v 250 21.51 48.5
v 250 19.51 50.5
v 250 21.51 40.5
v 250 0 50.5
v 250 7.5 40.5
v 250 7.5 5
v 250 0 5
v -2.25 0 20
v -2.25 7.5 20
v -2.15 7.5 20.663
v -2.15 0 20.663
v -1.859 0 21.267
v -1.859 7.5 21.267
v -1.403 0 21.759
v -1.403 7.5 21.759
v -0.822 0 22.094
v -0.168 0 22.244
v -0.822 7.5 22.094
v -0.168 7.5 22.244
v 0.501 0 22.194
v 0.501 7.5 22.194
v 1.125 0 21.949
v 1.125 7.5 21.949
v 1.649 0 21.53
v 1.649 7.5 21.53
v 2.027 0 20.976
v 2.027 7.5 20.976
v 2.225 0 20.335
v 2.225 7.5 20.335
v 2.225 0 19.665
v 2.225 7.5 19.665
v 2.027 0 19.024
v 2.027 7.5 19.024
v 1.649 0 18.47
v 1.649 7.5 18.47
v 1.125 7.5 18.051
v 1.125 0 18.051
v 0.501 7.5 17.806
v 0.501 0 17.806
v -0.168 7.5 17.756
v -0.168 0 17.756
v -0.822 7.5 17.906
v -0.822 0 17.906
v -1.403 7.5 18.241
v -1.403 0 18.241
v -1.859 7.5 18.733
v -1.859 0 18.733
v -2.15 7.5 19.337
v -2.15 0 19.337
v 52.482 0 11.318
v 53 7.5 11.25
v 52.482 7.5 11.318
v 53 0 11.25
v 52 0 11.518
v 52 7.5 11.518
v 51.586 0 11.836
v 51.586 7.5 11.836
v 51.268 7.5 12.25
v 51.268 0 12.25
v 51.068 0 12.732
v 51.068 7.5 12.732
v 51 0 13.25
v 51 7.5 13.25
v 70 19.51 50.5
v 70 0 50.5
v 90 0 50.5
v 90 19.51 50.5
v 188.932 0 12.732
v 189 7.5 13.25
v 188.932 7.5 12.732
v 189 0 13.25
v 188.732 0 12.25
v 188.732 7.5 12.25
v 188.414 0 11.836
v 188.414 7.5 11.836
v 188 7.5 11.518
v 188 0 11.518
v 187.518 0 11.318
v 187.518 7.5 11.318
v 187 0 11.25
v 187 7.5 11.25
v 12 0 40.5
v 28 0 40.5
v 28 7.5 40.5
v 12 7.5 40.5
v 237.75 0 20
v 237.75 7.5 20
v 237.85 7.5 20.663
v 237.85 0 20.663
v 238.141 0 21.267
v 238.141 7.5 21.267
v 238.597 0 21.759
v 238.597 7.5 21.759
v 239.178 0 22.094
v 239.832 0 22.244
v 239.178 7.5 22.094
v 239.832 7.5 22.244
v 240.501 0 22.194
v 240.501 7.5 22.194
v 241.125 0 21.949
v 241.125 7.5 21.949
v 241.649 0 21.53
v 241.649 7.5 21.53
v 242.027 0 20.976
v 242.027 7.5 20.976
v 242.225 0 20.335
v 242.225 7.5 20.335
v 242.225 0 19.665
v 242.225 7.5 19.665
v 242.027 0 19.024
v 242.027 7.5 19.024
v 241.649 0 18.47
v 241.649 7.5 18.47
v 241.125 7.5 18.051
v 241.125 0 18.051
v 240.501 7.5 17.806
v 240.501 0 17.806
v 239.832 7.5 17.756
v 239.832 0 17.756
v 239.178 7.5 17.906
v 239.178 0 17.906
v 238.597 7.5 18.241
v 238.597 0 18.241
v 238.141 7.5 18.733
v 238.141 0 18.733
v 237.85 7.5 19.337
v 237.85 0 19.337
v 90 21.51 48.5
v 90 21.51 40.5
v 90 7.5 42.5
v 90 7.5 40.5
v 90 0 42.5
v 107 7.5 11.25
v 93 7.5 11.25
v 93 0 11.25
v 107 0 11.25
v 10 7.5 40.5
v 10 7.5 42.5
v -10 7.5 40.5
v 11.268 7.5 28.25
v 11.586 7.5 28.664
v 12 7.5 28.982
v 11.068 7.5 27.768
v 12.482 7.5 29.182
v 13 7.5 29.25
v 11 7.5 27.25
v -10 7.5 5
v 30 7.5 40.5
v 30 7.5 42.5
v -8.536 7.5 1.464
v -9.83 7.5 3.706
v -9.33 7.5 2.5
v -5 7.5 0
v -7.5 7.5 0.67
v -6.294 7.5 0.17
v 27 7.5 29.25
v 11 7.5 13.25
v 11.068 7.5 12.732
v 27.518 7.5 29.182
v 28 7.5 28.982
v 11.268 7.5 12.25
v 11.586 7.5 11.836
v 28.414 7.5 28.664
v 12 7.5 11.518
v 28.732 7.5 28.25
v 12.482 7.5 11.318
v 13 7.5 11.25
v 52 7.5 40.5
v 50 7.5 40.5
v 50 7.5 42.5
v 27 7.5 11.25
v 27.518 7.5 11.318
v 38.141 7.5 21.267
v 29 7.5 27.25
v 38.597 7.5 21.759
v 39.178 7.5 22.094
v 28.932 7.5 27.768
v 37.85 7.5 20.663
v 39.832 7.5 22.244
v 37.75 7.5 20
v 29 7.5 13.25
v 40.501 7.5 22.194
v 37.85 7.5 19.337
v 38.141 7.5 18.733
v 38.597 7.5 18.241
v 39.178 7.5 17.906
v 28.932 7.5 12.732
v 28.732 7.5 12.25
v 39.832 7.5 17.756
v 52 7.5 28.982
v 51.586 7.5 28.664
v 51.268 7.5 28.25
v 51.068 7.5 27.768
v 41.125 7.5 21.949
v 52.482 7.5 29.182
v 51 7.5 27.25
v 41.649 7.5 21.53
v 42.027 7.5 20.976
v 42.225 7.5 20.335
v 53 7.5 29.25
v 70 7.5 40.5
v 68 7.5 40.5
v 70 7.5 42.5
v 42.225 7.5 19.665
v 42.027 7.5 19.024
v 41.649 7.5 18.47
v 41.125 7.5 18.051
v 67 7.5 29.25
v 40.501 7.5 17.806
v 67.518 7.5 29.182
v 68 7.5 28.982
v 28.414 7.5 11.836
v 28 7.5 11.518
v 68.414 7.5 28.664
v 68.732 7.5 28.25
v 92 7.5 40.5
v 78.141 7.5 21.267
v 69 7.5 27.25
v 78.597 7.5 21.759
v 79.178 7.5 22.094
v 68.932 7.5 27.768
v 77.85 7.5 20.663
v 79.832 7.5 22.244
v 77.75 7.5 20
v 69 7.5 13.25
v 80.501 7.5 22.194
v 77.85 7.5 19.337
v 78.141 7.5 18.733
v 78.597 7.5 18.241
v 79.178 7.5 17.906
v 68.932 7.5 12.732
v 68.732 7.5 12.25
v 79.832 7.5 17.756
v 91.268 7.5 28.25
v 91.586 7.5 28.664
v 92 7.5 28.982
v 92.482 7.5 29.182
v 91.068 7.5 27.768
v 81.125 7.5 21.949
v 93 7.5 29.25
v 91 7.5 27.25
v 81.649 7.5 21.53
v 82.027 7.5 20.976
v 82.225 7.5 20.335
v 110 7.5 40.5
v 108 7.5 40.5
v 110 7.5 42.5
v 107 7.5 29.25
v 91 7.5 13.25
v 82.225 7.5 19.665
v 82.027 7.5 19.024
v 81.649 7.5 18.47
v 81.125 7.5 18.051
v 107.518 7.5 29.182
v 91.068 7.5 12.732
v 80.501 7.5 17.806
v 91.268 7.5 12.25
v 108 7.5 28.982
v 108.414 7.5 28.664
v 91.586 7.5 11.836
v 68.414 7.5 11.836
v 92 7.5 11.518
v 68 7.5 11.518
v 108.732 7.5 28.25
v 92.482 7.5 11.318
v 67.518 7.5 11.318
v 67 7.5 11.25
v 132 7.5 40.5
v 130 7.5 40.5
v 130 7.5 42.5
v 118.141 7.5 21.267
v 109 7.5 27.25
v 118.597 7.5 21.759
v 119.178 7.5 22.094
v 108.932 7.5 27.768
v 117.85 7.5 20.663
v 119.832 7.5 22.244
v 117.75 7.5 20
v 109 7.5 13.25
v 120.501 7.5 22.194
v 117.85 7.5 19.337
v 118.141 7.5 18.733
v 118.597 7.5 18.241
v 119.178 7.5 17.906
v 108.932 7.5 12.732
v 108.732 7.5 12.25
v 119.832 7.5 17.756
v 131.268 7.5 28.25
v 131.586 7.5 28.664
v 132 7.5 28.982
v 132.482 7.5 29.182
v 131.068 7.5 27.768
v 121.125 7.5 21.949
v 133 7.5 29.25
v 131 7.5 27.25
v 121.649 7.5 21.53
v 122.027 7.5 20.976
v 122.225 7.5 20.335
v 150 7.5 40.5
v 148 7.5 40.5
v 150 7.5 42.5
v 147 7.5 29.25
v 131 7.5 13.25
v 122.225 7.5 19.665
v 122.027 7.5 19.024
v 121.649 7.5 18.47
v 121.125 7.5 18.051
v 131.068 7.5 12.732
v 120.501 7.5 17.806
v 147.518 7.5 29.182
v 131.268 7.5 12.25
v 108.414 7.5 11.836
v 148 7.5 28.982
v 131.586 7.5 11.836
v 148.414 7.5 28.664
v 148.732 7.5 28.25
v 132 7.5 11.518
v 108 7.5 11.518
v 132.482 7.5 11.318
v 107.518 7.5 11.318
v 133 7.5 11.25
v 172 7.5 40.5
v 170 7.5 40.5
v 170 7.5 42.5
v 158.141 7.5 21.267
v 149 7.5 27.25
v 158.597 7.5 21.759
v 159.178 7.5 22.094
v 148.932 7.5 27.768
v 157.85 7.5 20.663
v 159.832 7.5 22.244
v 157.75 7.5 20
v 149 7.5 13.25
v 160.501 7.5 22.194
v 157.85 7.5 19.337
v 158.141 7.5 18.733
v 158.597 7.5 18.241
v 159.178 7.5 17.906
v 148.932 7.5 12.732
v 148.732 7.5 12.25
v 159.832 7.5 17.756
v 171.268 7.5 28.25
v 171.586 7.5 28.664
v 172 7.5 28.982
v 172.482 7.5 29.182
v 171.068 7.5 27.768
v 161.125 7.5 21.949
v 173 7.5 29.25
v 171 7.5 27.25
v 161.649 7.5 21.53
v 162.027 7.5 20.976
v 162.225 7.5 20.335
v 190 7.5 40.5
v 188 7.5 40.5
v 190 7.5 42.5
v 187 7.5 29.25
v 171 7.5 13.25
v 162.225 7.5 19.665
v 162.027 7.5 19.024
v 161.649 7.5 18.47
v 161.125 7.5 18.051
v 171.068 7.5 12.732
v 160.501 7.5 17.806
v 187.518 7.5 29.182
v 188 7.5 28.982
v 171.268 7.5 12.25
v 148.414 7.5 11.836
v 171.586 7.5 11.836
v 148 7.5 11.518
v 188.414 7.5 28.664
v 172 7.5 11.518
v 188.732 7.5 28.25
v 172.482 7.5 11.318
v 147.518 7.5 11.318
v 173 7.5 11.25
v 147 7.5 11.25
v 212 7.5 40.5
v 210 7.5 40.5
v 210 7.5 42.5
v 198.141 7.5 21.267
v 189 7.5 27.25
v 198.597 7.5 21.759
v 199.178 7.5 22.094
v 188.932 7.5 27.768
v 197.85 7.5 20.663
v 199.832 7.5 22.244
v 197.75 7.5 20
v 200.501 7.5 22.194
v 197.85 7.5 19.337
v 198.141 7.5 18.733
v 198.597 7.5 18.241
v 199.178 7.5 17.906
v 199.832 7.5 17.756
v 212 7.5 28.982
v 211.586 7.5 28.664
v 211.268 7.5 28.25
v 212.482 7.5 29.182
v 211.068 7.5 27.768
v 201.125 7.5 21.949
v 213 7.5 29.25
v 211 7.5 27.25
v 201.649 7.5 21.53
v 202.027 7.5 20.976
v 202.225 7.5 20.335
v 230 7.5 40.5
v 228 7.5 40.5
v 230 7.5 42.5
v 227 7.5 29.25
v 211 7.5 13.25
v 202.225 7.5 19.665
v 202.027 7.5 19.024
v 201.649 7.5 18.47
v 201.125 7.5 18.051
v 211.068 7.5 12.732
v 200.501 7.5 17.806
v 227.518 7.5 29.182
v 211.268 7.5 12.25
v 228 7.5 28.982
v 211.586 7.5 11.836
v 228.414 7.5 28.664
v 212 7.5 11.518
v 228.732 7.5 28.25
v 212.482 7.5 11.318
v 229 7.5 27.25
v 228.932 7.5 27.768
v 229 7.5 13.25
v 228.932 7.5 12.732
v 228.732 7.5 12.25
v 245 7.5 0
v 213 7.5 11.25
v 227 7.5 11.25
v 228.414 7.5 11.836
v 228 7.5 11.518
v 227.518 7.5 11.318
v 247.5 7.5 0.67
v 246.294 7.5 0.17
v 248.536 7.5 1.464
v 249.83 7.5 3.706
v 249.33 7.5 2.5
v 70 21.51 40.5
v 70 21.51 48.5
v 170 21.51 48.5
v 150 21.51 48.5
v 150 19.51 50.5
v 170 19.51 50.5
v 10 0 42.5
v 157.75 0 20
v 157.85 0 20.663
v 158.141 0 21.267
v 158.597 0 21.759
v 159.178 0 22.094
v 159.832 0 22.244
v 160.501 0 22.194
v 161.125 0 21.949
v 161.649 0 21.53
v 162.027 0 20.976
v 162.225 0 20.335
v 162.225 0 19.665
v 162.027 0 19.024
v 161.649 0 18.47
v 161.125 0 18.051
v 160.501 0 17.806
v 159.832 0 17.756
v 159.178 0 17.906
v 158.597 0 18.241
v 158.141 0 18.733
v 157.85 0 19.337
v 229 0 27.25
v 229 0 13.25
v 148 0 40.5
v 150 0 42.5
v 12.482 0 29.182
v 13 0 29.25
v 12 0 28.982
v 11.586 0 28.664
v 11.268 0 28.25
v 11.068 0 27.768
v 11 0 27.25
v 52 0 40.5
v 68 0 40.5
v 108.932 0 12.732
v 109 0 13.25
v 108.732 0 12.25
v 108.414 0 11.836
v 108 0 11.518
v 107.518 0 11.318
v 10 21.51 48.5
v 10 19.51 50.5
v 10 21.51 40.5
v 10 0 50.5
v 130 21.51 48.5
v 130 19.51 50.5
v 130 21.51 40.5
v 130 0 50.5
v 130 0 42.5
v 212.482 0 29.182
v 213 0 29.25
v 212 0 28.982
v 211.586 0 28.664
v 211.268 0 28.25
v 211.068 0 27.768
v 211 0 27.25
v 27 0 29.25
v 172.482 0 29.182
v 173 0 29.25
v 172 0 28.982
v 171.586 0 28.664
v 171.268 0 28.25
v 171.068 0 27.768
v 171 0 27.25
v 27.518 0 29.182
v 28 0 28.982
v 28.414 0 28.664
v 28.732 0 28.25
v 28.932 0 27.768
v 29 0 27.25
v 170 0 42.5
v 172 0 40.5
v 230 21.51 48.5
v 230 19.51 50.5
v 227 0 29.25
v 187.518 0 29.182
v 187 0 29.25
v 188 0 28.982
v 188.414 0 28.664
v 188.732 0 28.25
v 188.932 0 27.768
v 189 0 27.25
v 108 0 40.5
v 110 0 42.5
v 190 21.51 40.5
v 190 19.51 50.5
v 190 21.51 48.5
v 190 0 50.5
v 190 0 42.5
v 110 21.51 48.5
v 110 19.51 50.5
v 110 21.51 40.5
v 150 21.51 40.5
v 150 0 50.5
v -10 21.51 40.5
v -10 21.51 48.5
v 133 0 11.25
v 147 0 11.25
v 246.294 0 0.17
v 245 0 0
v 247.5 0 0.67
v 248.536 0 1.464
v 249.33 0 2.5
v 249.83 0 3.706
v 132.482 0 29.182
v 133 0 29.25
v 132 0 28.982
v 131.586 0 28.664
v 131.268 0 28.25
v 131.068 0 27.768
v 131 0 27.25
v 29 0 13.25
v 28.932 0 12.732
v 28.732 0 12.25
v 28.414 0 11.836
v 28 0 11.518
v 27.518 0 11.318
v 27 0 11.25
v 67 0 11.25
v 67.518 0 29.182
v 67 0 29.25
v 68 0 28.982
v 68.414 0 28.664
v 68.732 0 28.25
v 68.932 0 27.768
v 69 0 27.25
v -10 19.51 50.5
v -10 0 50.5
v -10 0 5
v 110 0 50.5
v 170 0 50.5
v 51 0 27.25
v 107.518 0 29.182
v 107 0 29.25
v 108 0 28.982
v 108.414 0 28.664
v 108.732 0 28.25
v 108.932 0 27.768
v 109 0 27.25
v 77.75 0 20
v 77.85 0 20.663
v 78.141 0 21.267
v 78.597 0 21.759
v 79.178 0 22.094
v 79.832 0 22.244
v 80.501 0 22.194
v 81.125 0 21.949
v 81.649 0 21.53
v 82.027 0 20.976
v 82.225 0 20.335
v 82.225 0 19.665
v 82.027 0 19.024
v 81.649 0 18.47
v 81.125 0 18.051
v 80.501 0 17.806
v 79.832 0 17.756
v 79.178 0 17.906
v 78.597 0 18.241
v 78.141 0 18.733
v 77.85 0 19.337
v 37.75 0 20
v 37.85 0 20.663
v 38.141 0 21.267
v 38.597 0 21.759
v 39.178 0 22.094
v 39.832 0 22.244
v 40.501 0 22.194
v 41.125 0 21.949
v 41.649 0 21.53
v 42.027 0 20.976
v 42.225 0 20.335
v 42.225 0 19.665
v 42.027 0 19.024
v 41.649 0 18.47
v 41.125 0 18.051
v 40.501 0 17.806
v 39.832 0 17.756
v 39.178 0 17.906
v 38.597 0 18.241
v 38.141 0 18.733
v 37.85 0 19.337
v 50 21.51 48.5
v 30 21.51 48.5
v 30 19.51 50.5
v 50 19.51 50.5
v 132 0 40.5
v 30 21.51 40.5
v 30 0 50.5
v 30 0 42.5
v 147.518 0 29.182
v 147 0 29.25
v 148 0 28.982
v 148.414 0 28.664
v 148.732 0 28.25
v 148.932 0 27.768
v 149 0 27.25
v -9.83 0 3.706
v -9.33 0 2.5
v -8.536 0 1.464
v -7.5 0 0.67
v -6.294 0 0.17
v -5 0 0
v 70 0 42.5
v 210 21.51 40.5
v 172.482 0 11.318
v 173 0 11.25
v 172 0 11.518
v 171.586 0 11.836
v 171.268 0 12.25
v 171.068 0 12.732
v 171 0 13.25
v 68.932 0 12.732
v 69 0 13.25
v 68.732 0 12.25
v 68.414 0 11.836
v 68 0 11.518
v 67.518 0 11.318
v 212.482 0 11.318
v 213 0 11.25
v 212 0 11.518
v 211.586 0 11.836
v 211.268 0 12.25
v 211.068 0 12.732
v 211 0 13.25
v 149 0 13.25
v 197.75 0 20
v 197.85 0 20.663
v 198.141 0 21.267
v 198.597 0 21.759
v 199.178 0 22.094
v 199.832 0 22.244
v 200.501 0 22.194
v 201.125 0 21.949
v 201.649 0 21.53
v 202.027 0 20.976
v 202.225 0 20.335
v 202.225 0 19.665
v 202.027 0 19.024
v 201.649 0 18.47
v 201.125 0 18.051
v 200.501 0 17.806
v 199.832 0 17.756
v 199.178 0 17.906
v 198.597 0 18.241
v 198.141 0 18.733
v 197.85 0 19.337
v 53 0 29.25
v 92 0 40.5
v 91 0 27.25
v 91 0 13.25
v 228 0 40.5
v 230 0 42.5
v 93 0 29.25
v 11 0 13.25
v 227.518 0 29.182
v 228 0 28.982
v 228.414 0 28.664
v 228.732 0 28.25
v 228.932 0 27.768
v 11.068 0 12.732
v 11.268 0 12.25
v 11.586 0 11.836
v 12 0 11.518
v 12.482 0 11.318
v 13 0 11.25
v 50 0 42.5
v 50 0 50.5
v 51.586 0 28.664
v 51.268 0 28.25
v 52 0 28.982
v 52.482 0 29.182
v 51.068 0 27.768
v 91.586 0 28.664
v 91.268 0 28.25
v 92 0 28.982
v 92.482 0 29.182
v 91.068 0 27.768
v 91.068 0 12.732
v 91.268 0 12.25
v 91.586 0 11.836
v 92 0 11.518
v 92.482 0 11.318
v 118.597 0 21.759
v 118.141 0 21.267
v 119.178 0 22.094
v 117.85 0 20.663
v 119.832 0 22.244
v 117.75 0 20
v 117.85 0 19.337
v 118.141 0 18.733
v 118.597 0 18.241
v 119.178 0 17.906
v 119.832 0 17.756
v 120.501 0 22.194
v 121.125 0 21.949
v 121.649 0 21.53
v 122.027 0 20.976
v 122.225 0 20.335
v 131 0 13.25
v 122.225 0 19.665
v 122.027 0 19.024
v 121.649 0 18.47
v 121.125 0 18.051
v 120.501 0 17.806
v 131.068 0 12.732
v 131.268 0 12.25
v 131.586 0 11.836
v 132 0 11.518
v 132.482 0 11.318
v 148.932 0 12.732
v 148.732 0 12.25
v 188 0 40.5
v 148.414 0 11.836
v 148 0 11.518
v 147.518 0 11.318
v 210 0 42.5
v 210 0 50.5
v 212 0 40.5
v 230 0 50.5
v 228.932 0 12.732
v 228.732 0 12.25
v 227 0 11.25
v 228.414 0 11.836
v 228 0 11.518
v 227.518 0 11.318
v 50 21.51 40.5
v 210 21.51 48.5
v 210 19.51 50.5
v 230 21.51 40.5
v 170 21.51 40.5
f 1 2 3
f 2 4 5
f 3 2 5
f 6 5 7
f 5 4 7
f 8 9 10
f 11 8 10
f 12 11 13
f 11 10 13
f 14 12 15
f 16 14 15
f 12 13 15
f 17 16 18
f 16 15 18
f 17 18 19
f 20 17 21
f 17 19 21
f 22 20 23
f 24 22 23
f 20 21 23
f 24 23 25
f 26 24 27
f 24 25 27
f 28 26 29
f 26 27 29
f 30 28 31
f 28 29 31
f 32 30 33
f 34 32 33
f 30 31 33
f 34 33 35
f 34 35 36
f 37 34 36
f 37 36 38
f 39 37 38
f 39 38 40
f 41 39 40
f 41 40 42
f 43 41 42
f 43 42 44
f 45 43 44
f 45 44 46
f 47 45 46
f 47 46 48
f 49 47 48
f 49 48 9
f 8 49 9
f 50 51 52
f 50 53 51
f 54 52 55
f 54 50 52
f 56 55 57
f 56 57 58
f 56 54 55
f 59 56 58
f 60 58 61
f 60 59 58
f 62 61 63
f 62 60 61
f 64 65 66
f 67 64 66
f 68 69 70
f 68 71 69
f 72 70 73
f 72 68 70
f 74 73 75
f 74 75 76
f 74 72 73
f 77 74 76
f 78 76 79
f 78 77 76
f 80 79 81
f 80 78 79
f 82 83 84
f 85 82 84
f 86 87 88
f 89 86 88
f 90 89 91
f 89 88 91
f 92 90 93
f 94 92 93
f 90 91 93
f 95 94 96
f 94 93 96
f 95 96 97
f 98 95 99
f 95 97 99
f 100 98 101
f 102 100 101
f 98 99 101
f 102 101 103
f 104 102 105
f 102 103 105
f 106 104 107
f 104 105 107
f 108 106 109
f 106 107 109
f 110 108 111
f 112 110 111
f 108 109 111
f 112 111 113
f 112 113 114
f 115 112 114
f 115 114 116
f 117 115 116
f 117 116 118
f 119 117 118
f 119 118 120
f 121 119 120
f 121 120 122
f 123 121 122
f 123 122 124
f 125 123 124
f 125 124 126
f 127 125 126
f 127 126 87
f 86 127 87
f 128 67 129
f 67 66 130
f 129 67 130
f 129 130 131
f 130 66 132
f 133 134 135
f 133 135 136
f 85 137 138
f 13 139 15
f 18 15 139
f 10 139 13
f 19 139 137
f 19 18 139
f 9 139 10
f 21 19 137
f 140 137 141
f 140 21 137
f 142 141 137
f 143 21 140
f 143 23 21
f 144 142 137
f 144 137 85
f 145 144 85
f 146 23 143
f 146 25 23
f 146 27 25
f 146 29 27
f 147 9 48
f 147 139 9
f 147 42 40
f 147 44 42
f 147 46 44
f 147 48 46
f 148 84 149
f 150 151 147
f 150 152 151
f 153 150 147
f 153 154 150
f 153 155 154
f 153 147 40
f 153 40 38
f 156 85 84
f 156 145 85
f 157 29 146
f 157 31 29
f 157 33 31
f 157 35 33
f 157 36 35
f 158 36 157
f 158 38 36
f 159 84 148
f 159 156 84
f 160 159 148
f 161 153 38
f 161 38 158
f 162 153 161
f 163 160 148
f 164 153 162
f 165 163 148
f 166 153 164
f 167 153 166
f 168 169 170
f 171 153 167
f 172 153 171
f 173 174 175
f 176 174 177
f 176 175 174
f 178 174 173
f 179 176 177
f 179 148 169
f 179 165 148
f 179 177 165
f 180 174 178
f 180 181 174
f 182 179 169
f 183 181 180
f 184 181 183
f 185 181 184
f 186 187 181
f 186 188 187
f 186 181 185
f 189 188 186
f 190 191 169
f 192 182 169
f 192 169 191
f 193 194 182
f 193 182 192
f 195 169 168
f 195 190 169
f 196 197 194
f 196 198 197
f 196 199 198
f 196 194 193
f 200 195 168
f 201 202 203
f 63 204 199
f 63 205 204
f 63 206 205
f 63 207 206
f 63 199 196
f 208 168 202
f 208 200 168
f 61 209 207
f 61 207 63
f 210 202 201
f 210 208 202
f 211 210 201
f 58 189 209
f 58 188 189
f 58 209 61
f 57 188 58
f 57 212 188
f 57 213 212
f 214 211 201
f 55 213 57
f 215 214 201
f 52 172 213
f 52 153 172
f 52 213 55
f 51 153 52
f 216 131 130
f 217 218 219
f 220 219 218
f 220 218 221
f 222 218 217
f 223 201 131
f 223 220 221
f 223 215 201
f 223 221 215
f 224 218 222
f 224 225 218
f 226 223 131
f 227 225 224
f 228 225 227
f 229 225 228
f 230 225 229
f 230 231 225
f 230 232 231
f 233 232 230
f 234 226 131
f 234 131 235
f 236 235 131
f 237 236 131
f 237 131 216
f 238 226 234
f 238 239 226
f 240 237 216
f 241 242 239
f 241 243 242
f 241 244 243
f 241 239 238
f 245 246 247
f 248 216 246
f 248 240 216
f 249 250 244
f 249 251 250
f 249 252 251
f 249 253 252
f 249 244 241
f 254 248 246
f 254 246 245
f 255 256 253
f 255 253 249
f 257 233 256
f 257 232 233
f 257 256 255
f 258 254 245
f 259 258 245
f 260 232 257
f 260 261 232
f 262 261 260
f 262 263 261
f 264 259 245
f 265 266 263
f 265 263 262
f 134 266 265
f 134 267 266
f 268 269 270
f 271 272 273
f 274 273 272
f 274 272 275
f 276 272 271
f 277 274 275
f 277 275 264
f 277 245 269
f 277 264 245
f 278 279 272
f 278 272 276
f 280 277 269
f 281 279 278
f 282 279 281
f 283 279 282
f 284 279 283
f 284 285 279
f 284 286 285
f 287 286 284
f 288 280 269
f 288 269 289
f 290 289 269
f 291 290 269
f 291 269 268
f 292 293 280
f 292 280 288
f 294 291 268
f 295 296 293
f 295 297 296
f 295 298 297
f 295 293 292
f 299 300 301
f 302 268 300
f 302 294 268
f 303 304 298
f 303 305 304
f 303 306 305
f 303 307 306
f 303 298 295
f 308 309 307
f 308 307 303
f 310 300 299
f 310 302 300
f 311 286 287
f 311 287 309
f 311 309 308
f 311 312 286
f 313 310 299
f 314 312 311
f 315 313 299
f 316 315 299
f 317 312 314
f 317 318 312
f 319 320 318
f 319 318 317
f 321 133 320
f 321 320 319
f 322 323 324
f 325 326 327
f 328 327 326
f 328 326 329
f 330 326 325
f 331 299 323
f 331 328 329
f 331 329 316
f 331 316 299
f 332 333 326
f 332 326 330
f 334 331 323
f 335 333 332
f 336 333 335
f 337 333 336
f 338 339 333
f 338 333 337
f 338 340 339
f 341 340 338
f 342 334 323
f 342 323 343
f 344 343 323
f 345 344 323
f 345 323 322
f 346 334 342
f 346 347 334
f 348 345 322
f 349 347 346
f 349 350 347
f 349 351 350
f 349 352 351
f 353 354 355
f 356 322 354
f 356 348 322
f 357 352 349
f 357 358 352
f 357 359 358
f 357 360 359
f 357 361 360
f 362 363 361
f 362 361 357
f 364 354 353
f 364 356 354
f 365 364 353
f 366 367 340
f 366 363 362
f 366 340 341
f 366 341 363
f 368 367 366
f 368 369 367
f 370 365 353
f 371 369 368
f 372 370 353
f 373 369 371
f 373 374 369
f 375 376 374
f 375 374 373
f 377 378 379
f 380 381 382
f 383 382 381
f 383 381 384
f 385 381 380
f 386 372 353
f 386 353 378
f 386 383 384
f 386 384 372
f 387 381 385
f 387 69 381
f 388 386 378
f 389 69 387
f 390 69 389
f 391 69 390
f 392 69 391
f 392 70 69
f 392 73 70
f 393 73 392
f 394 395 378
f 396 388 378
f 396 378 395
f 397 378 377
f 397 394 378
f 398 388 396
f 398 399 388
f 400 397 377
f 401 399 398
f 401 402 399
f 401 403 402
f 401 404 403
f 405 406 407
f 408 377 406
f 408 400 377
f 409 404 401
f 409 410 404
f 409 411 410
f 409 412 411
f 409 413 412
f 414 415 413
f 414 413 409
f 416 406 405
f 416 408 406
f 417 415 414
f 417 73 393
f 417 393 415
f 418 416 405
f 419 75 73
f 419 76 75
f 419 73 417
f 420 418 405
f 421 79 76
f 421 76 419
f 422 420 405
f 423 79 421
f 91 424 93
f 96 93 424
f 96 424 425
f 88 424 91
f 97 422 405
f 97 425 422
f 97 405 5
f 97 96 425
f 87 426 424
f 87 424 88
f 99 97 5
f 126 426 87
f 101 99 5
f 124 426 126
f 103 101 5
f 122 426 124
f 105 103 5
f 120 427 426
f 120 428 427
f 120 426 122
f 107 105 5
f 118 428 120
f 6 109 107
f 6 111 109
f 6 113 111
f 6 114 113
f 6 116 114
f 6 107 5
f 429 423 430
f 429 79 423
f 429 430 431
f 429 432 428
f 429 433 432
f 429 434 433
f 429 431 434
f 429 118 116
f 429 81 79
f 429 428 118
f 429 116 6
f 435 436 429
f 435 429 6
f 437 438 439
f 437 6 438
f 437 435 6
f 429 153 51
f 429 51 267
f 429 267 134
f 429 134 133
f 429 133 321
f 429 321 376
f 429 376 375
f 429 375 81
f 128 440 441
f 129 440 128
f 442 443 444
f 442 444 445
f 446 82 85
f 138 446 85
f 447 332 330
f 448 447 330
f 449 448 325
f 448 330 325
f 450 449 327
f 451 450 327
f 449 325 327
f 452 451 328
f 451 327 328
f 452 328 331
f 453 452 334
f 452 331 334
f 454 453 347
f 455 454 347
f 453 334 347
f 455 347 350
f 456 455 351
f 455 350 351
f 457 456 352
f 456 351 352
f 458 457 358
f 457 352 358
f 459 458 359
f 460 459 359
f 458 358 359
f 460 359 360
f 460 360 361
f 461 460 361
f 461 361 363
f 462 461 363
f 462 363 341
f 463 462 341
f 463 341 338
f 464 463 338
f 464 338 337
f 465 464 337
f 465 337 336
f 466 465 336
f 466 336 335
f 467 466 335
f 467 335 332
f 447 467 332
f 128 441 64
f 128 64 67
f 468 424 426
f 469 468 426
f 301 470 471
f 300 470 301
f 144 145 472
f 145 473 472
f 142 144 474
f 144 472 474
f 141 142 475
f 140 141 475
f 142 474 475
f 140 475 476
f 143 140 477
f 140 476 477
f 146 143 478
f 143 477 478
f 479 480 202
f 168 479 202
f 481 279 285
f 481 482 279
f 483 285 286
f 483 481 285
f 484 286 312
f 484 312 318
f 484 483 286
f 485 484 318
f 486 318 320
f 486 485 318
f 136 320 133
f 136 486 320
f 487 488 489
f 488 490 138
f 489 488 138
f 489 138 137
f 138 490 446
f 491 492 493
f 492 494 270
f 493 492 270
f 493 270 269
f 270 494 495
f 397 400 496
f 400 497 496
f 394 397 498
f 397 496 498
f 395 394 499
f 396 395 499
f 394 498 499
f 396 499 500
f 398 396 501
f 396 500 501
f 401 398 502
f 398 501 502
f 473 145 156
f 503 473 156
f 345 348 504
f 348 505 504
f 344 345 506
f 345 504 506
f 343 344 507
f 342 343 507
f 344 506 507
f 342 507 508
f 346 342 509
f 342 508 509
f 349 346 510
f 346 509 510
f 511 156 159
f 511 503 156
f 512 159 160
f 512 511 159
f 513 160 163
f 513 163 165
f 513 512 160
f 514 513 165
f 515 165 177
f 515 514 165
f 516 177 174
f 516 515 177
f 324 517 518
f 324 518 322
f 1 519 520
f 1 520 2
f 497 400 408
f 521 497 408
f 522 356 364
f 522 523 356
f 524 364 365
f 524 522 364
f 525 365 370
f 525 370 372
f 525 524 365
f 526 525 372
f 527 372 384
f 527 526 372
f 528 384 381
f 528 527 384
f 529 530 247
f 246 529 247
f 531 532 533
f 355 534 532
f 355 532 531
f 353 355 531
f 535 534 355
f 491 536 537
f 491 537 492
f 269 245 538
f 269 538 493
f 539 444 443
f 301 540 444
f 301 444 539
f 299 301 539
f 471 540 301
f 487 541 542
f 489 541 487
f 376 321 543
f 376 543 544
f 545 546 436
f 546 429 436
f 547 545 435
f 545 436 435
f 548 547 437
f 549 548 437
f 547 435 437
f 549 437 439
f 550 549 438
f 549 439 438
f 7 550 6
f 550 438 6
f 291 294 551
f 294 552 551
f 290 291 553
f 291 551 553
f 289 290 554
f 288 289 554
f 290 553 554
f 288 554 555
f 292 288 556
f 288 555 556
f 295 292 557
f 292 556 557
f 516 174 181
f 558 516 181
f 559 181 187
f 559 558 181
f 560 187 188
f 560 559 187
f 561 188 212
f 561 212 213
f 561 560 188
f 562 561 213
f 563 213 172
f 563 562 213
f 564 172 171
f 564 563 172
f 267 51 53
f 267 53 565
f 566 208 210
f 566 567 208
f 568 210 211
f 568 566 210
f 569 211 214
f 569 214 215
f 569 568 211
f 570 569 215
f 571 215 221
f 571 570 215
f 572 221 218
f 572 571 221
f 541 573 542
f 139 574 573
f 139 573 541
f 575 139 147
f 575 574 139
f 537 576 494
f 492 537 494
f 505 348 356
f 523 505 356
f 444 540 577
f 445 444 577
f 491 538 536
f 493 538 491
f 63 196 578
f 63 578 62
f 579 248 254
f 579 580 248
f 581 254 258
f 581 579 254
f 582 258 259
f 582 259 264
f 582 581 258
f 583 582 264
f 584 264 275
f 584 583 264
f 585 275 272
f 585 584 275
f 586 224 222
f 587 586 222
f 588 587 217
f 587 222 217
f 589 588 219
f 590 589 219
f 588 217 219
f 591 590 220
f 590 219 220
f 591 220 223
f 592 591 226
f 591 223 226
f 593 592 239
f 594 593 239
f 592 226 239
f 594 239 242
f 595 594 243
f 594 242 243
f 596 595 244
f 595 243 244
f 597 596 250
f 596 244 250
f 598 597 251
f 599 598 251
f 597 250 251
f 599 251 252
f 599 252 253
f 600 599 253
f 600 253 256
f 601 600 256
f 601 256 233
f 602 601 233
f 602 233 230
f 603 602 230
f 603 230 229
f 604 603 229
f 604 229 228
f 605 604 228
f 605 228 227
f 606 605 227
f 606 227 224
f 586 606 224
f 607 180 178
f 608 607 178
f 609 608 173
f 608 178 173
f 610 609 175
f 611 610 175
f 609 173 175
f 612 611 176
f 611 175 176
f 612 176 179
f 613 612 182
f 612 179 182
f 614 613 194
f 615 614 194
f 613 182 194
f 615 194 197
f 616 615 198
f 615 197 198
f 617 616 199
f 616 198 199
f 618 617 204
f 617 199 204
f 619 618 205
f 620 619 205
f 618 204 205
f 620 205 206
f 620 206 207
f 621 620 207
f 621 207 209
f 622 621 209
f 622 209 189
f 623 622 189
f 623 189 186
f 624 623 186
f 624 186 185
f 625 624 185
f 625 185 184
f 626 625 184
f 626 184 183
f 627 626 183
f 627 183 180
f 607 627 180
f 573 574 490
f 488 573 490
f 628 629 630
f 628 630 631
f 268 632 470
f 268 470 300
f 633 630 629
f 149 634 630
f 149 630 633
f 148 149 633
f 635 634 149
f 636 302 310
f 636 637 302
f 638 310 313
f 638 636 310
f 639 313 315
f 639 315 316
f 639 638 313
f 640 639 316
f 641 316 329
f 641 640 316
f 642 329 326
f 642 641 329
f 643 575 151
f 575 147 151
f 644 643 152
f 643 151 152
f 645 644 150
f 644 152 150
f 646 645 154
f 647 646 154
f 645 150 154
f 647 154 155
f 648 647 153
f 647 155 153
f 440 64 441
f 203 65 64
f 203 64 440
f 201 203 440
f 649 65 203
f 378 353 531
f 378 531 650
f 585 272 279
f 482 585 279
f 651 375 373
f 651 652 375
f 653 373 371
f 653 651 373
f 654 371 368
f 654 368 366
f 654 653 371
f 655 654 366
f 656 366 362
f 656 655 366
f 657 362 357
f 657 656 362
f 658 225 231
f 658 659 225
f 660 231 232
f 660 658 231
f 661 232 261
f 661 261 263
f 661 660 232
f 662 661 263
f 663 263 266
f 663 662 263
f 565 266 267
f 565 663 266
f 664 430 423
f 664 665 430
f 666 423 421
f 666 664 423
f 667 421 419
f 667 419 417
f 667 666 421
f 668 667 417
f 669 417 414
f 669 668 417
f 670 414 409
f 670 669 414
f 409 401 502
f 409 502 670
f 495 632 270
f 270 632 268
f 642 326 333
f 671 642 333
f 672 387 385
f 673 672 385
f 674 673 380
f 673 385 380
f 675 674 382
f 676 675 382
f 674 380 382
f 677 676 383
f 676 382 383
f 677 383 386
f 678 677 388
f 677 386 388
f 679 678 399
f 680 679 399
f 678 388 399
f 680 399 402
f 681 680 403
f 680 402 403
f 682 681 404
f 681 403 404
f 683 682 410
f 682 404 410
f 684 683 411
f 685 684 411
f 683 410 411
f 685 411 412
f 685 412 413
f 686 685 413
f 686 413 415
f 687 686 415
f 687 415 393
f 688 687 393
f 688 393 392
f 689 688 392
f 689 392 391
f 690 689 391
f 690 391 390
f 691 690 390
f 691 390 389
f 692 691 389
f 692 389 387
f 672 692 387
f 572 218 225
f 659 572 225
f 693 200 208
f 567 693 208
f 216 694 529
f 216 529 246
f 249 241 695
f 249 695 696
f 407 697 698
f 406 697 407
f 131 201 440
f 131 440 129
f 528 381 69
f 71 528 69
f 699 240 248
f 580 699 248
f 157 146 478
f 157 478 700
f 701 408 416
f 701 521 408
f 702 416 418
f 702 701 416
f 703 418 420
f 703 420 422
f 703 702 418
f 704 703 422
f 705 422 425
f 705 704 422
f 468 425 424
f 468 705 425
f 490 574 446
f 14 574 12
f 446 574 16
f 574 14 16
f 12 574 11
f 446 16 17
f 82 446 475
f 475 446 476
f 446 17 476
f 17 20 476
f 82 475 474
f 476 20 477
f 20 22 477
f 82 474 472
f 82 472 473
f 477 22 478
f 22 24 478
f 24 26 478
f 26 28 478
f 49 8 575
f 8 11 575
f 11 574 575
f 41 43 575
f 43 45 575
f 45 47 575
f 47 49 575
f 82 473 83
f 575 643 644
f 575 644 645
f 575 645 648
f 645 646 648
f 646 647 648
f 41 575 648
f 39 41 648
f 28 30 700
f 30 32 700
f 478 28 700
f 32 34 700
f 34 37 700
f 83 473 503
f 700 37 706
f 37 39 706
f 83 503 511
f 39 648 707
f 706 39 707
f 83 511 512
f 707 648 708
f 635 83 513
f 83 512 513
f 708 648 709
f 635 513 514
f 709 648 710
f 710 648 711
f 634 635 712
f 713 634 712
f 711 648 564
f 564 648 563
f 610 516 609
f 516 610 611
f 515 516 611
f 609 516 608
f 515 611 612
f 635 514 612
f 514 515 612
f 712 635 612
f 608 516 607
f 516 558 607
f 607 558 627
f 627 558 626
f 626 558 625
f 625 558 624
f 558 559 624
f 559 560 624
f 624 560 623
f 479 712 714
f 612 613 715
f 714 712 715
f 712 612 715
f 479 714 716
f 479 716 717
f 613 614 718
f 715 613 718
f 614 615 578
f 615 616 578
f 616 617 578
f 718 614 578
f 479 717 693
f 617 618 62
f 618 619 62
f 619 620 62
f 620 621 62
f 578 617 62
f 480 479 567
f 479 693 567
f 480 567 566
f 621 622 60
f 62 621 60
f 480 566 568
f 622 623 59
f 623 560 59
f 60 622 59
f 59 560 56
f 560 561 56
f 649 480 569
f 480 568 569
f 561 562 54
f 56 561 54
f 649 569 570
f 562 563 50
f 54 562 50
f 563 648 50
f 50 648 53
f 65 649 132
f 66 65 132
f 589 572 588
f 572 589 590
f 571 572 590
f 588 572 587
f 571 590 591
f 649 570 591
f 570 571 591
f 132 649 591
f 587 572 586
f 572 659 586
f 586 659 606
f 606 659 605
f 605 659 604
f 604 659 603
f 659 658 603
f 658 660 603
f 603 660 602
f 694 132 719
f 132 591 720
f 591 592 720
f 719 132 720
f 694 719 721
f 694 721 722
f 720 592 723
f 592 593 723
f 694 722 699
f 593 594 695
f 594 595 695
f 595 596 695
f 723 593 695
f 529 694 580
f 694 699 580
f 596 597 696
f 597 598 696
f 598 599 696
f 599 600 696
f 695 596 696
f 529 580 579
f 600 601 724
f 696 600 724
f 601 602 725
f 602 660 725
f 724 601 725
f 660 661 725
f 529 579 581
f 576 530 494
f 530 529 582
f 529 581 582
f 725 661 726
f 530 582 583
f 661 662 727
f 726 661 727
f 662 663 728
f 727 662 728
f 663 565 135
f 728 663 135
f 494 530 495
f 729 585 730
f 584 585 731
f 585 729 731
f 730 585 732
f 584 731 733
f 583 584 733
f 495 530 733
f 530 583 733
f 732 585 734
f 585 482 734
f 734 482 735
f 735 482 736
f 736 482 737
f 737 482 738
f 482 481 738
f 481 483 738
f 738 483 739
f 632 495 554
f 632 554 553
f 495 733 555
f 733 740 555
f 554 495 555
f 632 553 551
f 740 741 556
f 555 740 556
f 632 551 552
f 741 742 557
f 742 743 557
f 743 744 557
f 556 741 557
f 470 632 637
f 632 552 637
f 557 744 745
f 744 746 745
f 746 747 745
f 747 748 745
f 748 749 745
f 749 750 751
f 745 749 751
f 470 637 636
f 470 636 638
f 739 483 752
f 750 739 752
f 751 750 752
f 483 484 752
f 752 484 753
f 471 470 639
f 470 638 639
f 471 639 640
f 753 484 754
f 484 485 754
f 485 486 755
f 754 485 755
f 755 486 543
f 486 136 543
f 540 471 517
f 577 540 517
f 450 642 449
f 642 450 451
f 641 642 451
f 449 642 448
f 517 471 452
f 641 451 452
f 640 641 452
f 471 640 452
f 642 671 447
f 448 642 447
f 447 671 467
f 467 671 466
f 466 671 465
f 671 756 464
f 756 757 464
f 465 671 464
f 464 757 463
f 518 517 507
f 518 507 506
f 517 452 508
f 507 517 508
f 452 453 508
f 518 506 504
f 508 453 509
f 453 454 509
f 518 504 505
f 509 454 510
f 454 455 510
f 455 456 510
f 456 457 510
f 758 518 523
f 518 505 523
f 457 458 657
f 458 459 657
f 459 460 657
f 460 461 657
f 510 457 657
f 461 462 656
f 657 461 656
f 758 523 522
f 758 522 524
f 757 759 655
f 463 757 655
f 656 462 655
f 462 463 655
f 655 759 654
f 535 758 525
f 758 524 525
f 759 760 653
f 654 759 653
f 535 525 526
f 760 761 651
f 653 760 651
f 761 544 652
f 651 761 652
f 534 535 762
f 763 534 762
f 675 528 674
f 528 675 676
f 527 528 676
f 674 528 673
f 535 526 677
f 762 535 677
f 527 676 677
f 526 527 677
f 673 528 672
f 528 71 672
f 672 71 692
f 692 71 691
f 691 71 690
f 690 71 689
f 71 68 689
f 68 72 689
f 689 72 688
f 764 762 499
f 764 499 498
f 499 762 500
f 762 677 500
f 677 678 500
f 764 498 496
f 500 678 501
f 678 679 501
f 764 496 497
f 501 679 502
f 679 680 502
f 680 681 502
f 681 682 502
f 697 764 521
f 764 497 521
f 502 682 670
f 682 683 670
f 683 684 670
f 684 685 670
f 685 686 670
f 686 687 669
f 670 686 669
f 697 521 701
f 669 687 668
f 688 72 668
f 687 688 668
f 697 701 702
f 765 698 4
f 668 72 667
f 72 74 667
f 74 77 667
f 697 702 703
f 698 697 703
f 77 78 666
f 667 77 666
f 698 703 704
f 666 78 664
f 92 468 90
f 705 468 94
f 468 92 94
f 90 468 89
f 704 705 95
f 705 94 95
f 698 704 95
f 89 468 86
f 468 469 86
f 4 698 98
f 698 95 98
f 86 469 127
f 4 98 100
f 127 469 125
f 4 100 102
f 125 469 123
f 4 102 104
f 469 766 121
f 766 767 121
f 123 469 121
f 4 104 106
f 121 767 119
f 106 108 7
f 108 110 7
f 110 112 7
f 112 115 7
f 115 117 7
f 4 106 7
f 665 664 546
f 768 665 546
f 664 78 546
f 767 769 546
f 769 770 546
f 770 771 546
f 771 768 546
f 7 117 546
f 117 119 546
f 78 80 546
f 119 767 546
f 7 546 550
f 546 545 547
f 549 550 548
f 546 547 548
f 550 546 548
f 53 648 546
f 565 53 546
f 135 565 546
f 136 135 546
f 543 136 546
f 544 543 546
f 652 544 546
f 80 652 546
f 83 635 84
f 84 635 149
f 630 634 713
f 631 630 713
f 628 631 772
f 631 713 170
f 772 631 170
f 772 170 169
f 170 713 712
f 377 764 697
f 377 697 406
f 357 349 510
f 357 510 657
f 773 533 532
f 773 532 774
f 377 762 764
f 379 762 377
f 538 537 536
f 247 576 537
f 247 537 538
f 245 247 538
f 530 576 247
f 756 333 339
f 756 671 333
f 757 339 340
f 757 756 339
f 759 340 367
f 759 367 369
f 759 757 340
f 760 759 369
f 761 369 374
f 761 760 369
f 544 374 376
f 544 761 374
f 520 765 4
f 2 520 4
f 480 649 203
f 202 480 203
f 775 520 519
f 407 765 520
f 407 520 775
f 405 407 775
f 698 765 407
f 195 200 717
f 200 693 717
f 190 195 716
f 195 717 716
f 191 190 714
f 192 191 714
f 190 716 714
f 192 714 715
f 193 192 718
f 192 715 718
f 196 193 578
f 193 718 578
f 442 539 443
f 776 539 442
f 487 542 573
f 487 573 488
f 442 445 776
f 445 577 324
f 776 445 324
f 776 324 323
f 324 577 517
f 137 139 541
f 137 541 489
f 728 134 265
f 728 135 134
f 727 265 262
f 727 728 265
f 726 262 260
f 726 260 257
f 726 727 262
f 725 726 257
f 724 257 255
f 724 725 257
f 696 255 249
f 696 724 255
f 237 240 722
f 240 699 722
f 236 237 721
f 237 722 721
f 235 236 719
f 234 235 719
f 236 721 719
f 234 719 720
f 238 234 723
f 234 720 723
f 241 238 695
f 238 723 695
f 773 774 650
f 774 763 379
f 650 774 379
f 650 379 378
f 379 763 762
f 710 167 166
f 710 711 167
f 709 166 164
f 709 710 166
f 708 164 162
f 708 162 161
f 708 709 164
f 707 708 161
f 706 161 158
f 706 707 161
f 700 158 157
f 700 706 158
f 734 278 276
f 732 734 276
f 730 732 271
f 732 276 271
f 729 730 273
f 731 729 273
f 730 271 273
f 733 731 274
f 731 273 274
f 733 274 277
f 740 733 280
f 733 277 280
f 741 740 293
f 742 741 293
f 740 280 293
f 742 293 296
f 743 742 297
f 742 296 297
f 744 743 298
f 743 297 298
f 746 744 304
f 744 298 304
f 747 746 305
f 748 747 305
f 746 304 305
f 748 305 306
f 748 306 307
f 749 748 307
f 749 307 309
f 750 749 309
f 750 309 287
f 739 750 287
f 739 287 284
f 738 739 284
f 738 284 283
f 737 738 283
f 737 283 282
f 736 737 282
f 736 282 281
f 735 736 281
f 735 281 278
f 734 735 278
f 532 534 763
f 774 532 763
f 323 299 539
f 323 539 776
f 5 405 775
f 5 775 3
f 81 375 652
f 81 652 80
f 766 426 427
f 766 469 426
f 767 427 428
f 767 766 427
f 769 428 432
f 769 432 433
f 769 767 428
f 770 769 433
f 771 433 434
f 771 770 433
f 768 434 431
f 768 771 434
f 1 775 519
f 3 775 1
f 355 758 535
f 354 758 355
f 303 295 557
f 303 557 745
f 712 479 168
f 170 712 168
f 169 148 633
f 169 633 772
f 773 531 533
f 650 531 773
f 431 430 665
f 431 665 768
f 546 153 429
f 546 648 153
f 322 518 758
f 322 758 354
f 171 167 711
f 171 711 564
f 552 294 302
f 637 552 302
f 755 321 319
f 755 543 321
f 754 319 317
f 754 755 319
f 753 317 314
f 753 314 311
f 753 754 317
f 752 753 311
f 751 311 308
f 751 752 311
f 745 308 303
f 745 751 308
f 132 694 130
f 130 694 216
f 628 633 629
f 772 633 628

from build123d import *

# Parameters (mm, degrees)
SKETCH1_W                = 20
SKETCH1_H                = 50.5
BOSS_EXTRUDE1_DEPTH      = 7.5
SKETCH2_W                = 20
SKETCH2_H                = 10
BOSS_EXTRUDE2_DEPTH      = 14.01
LPATTERN1_COUNT          = 7
LPATTERN1_PITCH          = 40
SKETCH4_W                = 40.5
SKETCH4_H                = 7.5
BOSS_EXTRUDE3_DEPTH      = 260
M4_CLEARANCE_HOLE1_D     = 4.5
M4_CLEARANCE_HOLE1_DEPTH = 7.5
LPATTERN2_COUNT          = 7
LPATTERN2_PITCH          = 40
SKETCH7_W                = 18
SKETCH7_H                = 18
CUT_EXTRUDE1_DEPTH       = 8.5
FILLET1_R                = 2
LPATTERN3_COUNT          = 6
LPATTERN3_PITCH          = 40
FILLET1_OF_LPATTERN3_R   = 2
FILLET2_R                = 5
CHAMFER1_SIZE            = 2
CHAMFER2_SIZE            = 2


with BuildPart() as part:
    # Sketch1 → Boss-Extrude1 (new body)
    with BuildSketch(Plane(origin=(0, 0, 0), x_dir=(1, 0, 0), z_dir=(0, 1, 0))):
        with Locations((0, -25.25)):
            Rectangle(SKETCH1_W, SKETCH1_H)
    extrude(amount=BOSS_EXTRUDE1_DEPTH)

    # Sketch2 → Boss-Extrude2 (add)
    with BuildSketch(Plane(origin=(0, 7.5, 0), x_dir=(1, 0, 0), z_dir=(0, 1, 0))):
        with Locations((0, -45.5)):
            Rectangle(SKETCH2_W, SKETCH2_H)
    extrude(amount=BOSS_EXTRUDE2_DEPTH)


with BuildPart() as lpattern1_1:
    # LPattern1: pattern copy
    add(part.part.moved(Location(Vector(1, 0, 0) * (1 * LPATTERN1_PITCH))))


with BuildPart() as lpattern1_2:
    # LPattern1: pattern copy
    add(part.part.moved(Location(Vector(1, 0, 0) * (2 * LPATTERN1_PITCH))))


with BuildPart() as lpattern1_3:
    # LPattern1: pattern copy
    add(part.part.moved(Location(Vector(1, 0, 0) * (3 * LPATTERN1_PITCH))))


with BuildPart() as lpattern1_4:
    # LPattern1: pattern copy
    add(part.part.moved(Location(Vector(1, 0, 0) * (4 * LPATTERN1_PITCH))))


with BuildPart() as lpattern1_5:
    # LPattern1: pattern copy
    add(part.part.moved(Location(Vector(1, 0, 0) * (5 * LPATTERN1_PITCH))))


with BuildPart() as lpattern1_6:
    # LPattern1: pattern copy
    add(part.part.moved(Location(Vector(1, 0, 0) * (6 * LPATTERN1_PITCH))))


with BuildPart() as part_1:
    add(part.part)

    add(lpattern1_1.part)  # Boss-Extrude3 merges LPattern1_1

    add(lpattern1_2.part)  # Boss-Extrude3 merges LPattern1_2

    add(lpattern1_3.part)  # Boss-Extrude3 merges LPattern1_3

    add(lpattern1_4.part)  # Boss-Extrude3 merges LPattern1_4

    add(lpattern1_5.part)  # Boss-Extrude3 merges LPattern1_5

    add(lpattern1_6.part)  # Boss-Extrude3 merges LPattern1_6
    # Sketch4 → Boss-Extrude3 (add, through all)
    with BuildSketch(Plane.ZY.offset(10)):
        with Locations((20.25, 3.75)):
            Rectangle(SKETCH4_W, SKETCH4_H)
    extrude(amount=-BOSS_EXTRUDE3_DEPTH)

    # M4 Clearance Hole1
    with Locations(Plane.XZ):
        with Locations((240, 20)):
            m4_clearance_hole1 = Hole(M4_CLEARANCE_HOLE1_D / 2, depth=M4_CLEARANCE_HOLE1_DEPTH)

    # LPattern2: M4 Clearance Hole1 ×7
    with Locations(*[(-i * LPATTERN2_PITCH, 0, 0) for i in range(1, LPATTERN2_COUNT)]):
        add(m4_clearance_hole1, mode=Mode.SUBTRACT)

    # Sketch7 → Cut-Extrude1 (cut, through all)
    with BuildSketch(Plane(origin=(0, 7.5, 0), x_dir=(1, 0, 0), z_dir=(0, 1, 0))):
        with Locations((220, -20.25)):
            Rectangle(SKETCH7_W, SKETCH7_H)
    cut_extrude1 = extrude(amount=-CUT_EXTRUDE1_DEPTH, mode=Mode.SUBTRACT)

    # Fillet1
    fillet1_edges = [part_1.edges().sort_by_distance(p)[0] for p in [
        (229, 3.75, 11.25),
        (229, 3.75, 29.25),
        (211, 3.75, 29.25),
        (211, 3.75, 11.25),
    ]]
    fillet(fillet1_edges, radius=FILLET1_R)

    # LPattern3: Cut-Extrude1 ×6
    with Locations(*[(-i * LPATTERN3_PITCH, 0, 0) for i in range(1, LPATTERN3_COUNT)]):
        add(cut_extrude1, mode=Mode.SUBTRACT)

    # Fillet1 of LPattern3
    fillet1_of_lpattern3_edges = [part_1.edges().sort_by_distance(p)[0] for p in [
        (189, 3.75, 11.25),
        (189, 3.75, 29.25),
        (171, 3.75, 29.25),
        (171, 3.75, 11.25),
        (149, 3.75, 11.25),
        (149, 3.75, 29.25),
        (131, 3.75, 29.25),
        (131, 3.75, 11.25),
        (109, 3.75, 11.25),
        (109, 3.75, 29.25),
        (91, 3.75, 29.25),
        (91, 3.75, 11.25),
        (69, 3.75, 11.25),
        (69, 3.75, 29.25),
        (51, 3.75, 29.25),
        (51, 3.75, 11.25),
        (29, 3.75, 11.25),
        (29, 3.75, 29.25),
        (11, 3.75, 29.25),
        (11, 3.75, 11.25),
    ]]
    fillet(fillet1_of_lpattern3_edges, radius=FILLET1_OF_LPATTERN3_R)

    # Fillet2
    fillet2_edges = [part_1.edges().sort_by_distance(p)[0] for p in [
        (250, 3.75, 0),
        (-10, 3.75, 0),
    ]]
    fillet(fillet2_edges, radius=FILLET2_R)

    # Chamfer1
    chamfer1_edges = [part_1.edges().sort_by_distance(p)[0] for p in [
        (120, 21.51, 50.5),
        (160, 21.51, 50.5),
        (200, 21.51, 50.5),
        (240, 21.51, 50.5),
        (0, 21.51, 50.5),
        (40, 21.51, 50.5),
        (80, 21.51, 50.5),
    ]]
    chamfer(chamfer1_edges, length=CHAMFER1_SIZE)

    # Chamfer2
    chamfer2_edges = [part_1.edges().sort_by_distance(p)[0] for p in [
        (110, 3.75, 40.5),
        (130, 3.75, 40.5),
        (150, 3.75, 40.5),
        (170, 3.75, 40.5),
        (190, 3.75, 40.5),
        (210, 3.75, 40.5),
        (230, 3.75, 40.5),
        (10, 3.75, 40.5),
        (50, 3.75, 40.5),
        (30, 3.75, 40.5),
        (70, 3.75, 40.5),
        (90, 3.75, 40.5),
    ]]
    chamfer(chamfer2_edges, length=CHAMFER2_SIZE)


solid = part_1.part
